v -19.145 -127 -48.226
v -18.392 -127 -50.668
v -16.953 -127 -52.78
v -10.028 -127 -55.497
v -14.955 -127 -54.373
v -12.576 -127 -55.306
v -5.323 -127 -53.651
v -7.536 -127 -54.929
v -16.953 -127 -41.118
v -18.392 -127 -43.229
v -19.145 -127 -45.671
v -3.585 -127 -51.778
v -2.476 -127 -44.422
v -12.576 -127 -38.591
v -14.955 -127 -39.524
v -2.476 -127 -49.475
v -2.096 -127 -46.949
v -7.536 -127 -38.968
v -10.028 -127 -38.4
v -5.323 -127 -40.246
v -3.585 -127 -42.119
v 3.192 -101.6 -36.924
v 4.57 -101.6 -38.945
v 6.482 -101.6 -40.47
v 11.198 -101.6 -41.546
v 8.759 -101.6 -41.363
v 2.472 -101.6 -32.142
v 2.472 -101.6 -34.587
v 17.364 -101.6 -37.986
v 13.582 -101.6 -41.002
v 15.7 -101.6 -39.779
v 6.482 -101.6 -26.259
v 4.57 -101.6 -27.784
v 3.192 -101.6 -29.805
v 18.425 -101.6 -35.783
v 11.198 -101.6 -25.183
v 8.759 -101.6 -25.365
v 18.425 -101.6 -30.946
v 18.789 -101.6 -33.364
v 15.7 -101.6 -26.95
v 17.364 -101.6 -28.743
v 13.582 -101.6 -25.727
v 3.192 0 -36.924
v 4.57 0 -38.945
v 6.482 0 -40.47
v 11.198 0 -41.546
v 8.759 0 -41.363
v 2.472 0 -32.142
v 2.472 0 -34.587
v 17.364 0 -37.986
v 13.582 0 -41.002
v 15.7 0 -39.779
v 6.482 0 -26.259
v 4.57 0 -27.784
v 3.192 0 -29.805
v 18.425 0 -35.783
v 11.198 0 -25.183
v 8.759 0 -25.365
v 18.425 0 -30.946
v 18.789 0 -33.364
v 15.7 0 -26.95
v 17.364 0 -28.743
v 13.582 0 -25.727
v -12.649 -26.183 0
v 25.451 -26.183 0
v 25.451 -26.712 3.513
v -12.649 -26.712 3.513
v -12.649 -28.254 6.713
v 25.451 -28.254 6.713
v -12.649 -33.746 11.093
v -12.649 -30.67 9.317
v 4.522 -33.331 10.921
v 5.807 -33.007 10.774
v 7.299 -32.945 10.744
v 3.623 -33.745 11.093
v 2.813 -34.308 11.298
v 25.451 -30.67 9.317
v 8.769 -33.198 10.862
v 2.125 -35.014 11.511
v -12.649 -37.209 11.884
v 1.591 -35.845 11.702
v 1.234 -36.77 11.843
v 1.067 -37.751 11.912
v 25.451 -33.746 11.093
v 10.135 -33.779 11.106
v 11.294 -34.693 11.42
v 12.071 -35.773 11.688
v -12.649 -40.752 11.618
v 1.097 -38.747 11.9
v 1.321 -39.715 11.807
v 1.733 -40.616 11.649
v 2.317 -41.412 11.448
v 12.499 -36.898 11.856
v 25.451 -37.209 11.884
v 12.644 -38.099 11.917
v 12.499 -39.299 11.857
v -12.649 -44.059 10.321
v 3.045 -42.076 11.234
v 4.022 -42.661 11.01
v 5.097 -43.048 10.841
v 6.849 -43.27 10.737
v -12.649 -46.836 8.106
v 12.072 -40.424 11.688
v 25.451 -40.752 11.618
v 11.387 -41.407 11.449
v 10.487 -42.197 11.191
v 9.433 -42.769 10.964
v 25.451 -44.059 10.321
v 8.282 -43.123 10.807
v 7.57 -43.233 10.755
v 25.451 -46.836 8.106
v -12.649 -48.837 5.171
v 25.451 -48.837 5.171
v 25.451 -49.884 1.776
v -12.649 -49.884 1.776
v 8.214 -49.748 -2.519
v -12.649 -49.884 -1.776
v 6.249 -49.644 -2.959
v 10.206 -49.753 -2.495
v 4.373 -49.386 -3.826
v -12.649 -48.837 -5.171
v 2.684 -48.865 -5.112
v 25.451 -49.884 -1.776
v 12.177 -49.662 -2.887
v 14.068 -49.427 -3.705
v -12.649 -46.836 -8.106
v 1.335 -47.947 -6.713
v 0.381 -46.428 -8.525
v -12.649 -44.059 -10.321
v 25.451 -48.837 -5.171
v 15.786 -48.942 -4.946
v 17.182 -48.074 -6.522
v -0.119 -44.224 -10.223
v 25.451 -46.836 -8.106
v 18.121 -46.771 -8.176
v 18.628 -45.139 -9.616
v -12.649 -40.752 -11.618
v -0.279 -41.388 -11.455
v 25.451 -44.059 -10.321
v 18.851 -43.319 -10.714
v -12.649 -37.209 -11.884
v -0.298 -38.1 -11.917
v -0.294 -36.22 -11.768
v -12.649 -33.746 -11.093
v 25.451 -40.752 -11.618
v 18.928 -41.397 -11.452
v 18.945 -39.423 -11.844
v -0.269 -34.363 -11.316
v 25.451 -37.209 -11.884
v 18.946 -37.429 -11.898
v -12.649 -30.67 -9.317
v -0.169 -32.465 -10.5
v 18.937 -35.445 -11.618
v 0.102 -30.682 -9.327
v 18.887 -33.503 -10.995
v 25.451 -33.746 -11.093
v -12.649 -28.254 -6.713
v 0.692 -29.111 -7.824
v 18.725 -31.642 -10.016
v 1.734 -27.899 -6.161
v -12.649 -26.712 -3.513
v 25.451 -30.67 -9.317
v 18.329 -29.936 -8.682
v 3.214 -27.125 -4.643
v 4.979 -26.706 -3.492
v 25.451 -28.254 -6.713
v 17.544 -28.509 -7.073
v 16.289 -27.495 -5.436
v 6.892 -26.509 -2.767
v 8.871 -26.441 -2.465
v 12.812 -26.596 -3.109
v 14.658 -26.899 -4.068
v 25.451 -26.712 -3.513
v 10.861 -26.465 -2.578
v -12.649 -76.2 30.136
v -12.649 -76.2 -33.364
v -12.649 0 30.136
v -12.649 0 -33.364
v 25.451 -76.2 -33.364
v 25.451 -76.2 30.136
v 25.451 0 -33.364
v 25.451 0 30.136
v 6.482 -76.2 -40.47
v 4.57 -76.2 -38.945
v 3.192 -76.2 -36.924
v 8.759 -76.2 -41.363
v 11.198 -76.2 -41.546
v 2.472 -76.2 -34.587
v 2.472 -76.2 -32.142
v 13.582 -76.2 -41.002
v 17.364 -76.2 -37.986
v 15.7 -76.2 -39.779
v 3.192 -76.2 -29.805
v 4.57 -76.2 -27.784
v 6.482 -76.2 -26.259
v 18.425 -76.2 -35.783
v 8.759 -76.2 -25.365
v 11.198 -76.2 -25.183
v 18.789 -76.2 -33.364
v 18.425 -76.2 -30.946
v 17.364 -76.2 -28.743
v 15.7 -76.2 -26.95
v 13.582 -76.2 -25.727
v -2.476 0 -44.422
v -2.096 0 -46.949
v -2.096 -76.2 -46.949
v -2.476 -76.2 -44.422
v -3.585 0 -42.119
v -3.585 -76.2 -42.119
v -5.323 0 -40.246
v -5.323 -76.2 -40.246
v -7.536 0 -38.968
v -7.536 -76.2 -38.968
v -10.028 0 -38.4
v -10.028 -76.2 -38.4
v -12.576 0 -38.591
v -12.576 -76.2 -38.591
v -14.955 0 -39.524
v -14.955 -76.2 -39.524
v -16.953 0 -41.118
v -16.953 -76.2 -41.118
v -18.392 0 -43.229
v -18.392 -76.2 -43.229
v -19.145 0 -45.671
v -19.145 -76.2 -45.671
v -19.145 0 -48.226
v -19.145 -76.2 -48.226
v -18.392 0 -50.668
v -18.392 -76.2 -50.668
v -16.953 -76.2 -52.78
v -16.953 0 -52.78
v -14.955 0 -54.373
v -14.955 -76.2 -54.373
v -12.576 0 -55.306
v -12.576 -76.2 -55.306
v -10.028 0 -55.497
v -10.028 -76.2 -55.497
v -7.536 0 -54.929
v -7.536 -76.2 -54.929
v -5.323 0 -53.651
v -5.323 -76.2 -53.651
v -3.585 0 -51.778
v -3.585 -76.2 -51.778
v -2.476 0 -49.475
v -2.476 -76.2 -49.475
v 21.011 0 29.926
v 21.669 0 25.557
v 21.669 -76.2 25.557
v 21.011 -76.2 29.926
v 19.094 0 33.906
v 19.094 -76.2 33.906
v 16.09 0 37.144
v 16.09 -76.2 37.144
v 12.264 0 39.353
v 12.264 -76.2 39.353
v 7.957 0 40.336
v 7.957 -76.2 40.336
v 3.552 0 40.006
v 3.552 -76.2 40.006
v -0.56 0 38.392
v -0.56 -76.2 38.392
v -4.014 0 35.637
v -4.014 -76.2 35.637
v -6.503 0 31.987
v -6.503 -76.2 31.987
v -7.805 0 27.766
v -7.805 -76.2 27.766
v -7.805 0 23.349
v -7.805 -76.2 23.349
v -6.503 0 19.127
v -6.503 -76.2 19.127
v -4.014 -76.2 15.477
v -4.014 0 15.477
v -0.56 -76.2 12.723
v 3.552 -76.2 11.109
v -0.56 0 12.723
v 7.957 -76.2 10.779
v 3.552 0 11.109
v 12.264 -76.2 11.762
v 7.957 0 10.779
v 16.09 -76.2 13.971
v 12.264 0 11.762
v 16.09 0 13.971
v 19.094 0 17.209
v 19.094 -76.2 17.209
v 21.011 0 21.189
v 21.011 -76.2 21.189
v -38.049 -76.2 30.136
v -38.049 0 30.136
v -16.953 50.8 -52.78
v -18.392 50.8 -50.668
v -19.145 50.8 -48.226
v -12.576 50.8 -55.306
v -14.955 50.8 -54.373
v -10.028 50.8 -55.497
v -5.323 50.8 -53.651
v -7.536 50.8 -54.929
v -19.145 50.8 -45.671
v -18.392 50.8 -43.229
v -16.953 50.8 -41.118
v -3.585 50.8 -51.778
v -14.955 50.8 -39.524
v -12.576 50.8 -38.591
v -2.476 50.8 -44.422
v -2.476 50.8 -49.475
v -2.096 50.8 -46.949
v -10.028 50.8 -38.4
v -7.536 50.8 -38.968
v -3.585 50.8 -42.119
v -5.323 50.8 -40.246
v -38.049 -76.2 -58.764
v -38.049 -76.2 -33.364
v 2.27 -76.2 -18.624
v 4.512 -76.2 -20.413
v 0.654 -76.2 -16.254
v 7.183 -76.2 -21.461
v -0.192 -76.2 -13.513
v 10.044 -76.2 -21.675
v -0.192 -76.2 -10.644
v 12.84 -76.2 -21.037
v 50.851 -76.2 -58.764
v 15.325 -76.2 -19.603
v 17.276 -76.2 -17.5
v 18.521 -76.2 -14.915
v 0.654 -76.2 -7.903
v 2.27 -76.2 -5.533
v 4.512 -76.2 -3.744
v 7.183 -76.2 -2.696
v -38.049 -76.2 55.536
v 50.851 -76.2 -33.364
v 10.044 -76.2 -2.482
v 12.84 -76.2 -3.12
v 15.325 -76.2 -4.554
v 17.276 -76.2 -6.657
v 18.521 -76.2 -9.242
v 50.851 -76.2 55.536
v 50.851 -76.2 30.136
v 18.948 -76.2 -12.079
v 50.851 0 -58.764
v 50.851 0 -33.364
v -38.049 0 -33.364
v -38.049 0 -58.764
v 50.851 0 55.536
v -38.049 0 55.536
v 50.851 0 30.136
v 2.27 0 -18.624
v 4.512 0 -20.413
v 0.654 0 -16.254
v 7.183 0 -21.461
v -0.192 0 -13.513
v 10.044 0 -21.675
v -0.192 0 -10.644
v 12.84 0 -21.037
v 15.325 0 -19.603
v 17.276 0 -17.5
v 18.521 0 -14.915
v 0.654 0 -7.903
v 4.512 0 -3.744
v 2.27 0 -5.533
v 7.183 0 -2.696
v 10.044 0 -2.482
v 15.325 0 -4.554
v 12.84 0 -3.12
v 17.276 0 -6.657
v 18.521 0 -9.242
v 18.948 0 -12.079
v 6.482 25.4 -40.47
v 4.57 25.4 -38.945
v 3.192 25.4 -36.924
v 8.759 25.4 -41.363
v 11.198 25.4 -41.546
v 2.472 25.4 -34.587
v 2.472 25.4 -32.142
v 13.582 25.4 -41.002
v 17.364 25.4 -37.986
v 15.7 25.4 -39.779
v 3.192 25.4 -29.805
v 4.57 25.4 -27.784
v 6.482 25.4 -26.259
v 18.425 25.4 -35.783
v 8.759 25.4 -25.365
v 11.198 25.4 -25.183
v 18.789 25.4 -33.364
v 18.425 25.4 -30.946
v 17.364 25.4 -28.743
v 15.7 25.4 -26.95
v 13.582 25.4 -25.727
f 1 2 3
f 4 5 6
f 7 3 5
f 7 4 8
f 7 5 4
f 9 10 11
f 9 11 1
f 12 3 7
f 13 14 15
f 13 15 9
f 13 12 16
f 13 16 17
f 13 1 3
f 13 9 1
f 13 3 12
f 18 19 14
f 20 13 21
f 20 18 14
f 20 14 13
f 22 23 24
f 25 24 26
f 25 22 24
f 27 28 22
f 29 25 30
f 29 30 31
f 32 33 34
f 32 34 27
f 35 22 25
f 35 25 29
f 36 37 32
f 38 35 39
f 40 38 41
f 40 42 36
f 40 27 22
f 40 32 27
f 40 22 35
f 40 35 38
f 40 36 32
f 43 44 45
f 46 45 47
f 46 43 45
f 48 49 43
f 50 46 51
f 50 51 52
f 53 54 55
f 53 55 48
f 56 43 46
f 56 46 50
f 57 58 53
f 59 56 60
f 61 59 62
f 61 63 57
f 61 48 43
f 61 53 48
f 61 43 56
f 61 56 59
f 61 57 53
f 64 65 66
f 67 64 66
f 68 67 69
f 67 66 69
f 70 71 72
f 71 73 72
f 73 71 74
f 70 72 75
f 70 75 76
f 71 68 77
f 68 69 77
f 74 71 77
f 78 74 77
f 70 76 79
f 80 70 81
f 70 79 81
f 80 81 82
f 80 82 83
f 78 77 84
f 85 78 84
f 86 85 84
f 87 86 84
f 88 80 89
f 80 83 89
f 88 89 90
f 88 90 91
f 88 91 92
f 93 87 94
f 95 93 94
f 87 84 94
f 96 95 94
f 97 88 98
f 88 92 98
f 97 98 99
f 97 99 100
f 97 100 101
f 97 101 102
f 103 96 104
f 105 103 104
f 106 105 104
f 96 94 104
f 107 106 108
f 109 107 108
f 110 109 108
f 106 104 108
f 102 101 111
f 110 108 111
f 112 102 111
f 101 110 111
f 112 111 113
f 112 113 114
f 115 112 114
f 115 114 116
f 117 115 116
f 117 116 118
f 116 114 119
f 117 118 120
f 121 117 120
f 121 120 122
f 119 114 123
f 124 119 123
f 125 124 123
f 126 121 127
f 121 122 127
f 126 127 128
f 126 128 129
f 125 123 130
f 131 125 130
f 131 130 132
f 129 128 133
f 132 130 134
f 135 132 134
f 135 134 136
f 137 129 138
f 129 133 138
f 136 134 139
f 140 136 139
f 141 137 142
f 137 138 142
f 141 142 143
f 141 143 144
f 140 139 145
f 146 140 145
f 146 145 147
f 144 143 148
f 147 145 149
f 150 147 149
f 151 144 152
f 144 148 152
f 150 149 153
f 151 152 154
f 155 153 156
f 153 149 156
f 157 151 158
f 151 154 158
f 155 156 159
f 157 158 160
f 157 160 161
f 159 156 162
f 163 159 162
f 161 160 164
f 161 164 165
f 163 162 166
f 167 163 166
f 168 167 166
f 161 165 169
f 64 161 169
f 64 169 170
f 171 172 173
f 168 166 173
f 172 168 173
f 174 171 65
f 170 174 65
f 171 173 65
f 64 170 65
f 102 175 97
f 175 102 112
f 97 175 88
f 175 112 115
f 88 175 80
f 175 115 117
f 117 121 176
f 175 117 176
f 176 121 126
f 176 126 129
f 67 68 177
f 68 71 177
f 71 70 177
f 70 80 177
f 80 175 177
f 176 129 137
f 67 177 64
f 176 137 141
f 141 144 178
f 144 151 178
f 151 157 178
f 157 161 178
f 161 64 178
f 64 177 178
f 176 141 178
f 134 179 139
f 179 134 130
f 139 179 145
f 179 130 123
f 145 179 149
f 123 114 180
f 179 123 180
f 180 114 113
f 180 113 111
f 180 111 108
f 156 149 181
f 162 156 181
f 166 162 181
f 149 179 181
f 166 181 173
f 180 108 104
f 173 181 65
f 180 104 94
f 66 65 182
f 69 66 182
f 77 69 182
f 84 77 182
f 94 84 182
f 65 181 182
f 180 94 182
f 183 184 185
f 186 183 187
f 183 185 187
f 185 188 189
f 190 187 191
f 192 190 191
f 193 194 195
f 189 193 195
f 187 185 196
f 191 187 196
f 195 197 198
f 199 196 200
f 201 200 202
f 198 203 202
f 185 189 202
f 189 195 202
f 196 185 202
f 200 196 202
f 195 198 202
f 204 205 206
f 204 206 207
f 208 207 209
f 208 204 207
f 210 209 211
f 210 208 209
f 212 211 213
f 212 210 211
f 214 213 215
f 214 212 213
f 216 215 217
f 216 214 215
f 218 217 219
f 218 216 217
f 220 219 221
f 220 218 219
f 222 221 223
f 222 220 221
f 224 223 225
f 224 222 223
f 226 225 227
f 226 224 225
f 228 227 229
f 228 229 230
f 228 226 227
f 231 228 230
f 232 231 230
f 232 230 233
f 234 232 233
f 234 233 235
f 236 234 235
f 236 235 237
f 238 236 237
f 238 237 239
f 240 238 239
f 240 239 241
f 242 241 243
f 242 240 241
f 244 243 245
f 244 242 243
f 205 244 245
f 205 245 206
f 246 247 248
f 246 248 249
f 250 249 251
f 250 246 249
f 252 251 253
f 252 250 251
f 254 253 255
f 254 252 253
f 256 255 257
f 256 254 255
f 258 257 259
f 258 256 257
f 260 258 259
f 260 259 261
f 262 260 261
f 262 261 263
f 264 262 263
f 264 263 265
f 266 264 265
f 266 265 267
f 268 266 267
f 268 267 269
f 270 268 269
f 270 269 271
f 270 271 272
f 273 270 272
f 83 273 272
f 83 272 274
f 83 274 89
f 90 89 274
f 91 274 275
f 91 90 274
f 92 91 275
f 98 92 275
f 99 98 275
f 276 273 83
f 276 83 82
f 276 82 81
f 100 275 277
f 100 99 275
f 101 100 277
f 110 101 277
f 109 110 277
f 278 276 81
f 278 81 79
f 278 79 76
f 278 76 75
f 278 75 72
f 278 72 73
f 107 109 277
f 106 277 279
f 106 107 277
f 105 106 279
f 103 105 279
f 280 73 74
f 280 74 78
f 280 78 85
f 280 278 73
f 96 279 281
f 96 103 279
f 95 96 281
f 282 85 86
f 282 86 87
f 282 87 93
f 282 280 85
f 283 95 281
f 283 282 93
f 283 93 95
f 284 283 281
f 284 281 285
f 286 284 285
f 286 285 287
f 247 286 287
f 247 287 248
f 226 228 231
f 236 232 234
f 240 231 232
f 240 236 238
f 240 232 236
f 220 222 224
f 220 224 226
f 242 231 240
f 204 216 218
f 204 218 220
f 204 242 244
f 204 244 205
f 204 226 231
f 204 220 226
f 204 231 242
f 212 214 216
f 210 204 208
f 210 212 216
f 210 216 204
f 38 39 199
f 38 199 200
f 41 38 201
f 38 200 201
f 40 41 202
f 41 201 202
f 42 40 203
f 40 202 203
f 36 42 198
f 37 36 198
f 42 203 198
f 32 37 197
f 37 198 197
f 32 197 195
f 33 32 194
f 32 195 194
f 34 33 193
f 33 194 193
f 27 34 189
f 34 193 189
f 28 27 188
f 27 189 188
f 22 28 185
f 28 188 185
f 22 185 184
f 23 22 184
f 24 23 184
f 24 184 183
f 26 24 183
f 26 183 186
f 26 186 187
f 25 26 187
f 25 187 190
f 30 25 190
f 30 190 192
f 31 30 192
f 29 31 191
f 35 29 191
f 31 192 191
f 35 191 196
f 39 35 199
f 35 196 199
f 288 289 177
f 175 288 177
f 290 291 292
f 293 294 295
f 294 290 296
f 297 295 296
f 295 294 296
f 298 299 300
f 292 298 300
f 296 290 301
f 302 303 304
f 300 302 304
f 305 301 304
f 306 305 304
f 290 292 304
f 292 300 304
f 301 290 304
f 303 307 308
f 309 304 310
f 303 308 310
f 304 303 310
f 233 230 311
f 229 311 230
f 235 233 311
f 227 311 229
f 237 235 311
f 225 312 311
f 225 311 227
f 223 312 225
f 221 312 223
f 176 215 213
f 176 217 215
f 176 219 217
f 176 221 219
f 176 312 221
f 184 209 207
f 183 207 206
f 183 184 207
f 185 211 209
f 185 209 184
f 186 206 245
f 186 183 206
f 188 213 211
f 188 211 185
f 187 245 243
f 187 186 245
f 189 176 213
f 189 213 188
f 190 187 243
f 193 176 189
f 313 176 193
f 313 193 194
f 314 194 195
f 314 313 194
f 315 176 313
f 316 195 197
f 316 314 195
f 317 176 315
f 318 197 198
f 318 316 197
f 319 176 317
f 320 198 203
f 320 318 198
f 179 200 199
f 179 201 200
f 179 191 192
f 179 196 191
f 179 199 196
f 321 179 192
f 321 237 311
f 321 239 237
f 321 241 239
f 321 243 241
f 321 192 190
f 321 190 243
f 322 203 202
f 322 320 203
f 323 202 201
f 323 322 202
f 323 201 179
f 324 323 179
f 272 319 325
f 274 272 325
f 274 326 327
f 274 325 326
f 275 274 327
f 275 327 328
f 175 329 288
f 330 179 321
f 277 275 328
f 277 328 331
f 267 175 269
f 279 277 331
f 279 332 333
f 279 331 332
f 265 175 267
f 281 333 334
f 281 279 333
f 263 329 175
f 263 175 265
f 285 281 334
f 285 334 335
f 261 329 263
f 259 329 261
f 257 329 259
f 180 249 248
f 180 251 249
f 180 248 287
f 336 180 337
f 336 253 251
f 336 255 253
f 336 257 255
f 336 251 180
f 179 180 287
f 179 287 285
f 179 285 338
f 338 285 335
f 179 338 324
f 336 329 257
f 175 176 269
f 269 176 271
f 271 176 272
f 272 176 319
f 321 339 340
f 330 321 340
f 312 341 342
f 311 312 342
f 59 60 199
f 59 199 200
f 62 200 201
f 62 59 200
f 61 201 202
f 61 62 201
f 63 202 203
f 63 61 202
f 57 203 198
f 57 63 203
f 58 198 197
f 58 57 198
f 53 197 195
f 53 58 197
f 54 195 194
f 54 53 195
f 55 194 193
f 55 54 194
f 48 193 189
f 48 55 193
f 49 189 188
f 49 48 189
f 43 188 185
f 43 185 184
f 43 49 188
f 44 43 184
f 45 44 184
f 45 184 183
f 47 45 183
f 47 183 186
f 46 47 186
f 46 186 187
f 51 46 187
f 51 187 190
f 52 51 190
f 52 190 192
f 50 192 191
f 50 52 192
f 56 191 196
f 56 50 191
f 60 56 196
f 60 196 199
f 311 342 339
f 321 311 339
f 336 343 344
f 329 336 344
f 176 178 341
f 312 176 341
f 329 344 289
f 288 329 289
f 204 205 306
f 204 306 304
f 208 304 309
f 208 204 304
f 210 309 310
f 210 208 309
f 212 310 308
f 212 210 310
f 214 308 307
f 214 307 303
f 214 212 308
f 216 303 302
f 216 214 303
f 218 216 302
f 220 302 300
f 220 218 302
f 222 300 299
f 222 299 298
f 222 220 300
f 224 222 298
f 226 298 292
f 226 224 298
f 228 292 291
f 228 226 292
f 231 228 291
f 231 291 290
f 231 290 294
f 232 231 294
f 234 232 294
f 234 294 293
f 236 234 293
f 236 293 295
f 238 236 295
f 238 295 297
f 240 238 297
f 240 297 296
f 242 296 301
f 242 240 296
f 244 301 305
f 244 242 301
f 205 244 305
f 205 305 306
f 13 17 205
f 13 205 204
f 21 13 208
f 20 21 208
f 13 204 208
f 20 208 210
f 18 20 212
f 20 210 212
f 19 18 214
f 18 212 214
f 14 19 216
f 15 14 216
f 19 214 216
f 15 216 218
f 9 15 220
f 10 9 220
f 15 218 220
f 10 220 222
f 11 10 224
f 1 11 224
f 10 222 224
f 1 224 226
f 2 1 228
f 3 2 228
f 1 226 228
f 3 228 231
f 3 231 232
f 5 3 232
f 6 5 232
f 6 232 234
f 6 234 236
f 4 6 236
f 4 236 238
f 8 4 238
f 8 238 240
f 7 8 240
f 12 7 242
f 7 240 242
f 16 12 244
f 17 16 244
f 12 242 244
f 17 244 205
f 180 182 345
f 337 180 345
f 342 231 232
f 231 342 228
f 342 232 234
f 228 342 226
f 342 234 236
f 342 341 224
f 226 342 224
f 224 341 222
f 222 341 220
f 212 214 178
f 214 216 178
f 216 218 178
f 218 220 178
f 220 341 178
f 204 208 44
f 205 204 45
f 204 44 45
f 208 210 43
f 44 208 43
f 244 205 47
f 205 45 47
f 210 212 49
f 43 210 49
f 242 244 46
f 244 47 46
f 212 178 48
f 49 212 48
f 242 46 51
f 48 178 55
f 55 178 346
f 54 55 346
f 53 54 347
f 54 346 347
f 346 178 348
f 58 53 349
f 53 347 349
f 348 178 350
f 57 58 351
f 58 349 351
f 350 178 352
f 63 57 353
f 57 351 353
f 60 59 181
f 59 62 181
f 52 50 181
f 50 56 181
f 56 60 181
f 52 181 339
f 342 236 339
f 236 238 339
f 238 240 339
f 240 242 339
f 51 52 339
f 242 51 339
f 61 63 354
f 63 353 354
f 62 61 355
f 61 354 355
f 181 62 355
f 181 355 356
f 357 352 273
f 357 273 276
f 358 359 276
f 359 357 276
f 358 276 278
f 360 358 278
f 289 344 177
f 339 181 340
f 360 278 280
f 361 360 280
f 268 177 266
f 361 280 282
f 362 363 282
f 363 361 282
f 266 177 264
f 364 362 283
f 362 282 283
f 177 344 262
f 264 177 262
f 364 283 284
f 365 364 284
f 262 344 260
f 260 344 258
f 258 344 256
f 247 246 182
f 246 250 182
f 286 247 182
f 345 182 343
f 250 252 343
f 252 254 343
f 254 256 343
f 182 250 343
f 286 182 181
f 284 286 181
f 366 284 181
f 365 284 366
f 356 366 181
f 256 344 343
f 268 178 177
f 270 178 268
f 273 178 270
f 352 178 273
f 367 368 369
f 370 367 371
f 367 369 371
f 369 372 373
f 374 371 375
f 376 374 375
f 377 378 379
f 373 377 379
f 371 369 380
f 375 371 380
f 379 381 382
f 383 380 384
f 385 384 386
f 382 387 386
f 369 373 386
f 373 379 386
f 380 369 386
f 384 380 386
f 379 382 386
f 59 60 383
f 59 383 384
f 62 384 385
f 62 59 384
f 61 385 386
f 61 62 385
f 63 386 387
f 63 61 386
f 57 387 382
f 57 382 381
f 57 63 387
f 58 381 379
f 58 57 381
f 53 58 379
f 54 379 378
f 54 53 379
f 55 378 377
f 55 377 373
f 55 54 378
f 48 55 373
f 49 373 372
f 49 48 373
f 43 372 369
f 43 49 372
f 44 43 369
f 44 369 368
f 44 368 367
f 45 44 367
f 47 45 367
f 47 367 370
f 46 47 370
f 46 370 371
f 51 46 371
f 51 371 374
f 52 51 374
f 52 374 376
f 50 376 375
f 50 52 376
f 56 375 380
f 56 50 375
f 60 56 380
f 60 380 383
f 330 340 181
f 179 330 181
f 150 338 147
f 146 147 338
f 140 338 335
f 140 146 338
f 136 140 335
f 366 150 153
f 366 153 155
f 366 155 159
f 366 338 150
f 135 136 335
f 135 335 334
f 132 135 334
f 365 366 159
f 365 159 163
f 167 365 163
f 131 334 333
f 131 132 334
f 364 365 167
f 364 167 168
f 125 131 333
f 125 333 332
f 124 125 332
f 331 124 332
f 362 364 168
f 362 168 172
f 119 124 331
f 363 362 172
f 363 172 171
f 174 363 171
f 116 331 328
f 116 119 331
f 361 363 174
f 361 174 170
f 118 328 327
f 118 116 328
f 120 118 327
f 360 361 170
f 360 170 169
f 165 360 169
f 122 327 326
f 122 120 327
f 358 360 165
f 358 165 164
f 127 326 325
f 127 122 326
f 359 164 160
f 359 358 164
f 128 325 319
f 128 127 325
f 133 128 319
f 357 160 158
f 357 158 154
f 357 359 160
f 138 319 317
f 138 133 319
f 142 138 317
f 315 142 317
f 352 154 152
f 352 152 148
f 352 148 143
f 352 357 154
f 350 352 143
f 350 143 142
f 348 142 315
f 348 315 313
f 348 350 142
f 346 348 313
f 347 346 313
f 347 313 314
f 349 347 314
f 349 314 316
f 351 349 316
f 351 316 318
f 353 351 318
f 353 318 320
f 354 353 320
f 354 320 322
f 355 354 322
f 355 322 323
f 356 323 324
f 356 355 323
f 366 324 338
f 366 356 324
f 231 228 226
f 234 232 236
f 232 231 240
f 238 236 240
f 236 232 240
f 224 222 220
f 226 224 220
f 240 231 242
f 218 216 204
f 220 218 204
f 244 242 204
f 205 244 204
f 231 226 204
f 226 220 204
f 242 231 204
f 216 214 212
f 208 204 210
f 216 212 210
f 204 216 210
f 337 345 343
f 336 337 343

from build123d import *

# Parameters (mm, degrees)
F0_R     = 8.57274
F0_R_2   = 8.204632
F0_R_3   = 9.623839
F0_R_4   = 14.819893
F1_DEPTH = 76.2
F3_R     = 11.91717
F4_DEPTH = 63.501
F5_DEPTH = 25.4
F6_DEPTH = 50.8
F2_R     = 8.204632
F7_DEPTH = 25.4
F8_DEPTH = 127


with BuildPart() as f1:
    # F0 (on Front) → F1 (new body)
    with BuildSketch(Plane.XZ):
        Polygon((-38.049199, -33.364403), (-38.049199, -58.764403), (50.850801, -58.764403), (50.850801, -33.364403), (25.450801, -33.364403), (25.450801, 30.135597), (50.850801, 30.135597), (50.850801, 54.746323), (50.850801, 55.535597), (-38.049199, 55.535597), (-38.049199, 30.135597), (-12.649199, 30.135597), (-12.649199, -33.364403), align=None)
        with Locations((-10.668308, -46.948627)):
            Circle(F0_R, mode=Mode.SUBTRACT)
        with Locations((10.584558, -33.364403)):
            Circle(F0_R_2, mode=Mode.SUBTRACT)
        with Locations((9.324345, -12.078556)):
            Circle(F0_R_3, mode=Mode.SUBTRACT)
        with Locations((6.849488, 25.557365)):
            Circle(F0_R_4, mode=Mode.SUBTRACT)
    extrude(amount=F1_DEPTH)

    # F3 (on face) → F4 (cut, through all)
    with BuildSketch(Plane.YZ.offset(25.450801)):
        with Locations((-38.1, 0)):
            Circle(F3_R)
    extrude(amount=-F4_DEPTH, mode=Mode.SUBTRACT)

    # F0 (on Front) → F5 (join)
    with BuildSketch(Plane.XZ):
        with Locations((10.584558, -33.364403)):
            Circle(F0_R_2)
    extrude(amount=-F5_DEPTH)

    # F0 (on Front) → F6 (join)
    with BuildSketch(Plane.XZ):
        with Locations((-10.668308, -46.948627)):
            Circle(F0_R)
    extrude(amount=-F6_DEPTH)


with BuildPart() as f7:
    # F2 (on face) → F7 (new body)
    with BuildSketch(Plane.XZ.offset(76.2)):
        with Locations((10.584558, -33.364403)):
            Circle(F2_R)
    extrude(amount=F7_DEPTH)


with BuildPart() as f8:
    # F0 (on Front) → F8 (new body)
    with BuildSketch(Plane.XZ):
        with Locations((-10.668308, -46.948627)):
            Circle(F0_R)
    extrude(amount=F8_DEPTH)


solid = Compound([f1.part, f7.part, f8.part])
